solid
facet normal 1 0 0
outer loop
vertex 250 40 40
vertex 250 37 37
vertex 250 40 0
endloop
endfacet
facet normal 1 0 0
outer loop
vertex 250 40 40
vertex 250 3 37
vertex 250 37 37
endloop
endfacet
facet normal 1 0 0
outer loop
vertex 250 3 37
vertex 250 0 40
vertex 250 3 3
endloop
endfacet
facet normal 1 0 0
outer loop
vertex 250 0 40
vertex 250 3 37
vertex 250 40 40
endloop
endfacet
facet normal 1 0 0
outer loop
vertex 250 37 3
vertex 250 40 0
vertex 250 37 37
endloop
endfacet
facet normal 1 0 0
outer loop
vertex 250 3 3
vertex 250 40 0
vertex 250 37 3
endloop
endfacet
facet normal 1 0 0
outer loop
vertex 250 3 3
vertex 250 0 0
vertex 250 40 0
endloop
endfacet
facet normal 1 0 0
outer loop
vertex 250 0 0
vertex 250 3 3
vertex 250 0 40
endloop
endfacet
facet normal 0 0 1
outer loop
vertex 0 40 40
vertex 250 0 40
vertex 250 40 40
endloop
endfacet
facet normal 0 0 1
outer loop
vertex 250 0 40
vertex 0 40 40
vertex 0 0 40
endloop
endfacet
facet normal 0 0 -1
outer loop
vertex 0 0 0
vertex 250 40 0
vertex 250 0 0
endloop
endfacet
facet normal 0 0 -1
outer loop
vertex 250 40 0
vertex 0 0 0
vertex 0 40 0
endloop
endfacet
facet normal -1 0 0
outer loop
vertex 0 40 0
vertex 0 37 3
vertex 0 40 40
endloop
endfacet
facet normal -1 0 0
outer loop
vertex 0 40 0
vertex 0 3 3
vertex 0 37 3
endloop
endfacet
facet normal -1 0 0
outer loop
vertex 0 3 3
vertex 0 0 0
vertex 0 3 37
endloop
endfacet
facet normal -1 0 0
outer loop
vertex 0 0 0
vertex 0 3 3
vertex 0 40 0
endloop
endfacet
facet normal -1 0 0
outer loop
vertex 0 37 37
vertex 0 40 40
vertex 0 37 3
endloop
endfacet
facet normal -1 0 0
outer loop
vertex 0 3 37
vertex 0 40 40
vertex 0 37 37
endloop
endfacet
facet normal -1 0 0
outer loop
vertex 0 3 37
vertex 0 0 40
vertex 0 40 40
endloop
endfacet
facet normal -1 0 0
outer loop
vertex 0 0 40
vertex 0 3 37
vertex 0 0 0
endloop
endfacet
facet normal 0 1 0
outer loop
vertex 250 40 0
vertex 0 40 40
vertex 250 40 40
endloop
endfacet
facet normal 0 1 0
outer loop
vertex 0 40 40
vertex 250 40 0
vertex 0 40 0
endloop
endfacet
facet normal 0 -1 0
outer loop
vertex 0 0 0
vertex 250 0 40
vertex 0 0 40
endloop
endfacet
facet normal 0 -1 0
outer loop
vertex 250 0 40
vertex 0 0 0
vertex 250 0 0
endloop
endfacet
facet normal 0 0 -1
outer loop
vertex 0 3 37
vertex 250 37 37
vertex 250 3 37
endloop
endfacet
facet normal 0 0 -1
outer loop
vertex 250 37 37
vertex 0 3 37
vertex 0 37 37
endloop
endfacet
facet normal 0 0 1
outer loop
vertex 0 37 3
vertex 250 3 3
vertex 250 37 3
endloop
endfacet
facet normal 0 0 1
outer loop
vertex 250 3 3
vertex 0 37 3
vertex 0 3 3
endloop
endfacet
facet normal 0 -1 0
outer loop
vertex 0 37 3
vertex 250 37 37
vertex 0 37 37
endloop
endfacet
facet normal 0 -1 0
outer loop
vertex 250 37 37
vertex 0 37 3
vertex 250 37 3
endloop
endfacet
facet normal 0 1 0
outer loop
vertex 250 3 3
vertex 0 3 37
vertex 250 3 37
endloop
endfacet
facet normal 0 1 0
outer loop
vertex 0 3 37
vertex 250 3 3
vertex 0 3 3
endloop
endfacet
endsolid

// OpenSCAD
$fn = 32;

// ----------------------------------------------------------------------
// Box beam: 200-250 mm hollow beam
// ----------------------------------------------------------------------

// --- parameters (mm) ---
beam_l = 250;             // beam length, X
beam_w = 40;              // beam width, Y
beam_h = 40;              // beam height, Z
wall = 3;                 // wall thickness

difference() {
  cube([beam_l, beam_w, beam_h]);
  translate([-1, wall, wall])
    cube([beam_l + 2, beam_w - 2 * wall, beam_h - 2 * wall]);
}
